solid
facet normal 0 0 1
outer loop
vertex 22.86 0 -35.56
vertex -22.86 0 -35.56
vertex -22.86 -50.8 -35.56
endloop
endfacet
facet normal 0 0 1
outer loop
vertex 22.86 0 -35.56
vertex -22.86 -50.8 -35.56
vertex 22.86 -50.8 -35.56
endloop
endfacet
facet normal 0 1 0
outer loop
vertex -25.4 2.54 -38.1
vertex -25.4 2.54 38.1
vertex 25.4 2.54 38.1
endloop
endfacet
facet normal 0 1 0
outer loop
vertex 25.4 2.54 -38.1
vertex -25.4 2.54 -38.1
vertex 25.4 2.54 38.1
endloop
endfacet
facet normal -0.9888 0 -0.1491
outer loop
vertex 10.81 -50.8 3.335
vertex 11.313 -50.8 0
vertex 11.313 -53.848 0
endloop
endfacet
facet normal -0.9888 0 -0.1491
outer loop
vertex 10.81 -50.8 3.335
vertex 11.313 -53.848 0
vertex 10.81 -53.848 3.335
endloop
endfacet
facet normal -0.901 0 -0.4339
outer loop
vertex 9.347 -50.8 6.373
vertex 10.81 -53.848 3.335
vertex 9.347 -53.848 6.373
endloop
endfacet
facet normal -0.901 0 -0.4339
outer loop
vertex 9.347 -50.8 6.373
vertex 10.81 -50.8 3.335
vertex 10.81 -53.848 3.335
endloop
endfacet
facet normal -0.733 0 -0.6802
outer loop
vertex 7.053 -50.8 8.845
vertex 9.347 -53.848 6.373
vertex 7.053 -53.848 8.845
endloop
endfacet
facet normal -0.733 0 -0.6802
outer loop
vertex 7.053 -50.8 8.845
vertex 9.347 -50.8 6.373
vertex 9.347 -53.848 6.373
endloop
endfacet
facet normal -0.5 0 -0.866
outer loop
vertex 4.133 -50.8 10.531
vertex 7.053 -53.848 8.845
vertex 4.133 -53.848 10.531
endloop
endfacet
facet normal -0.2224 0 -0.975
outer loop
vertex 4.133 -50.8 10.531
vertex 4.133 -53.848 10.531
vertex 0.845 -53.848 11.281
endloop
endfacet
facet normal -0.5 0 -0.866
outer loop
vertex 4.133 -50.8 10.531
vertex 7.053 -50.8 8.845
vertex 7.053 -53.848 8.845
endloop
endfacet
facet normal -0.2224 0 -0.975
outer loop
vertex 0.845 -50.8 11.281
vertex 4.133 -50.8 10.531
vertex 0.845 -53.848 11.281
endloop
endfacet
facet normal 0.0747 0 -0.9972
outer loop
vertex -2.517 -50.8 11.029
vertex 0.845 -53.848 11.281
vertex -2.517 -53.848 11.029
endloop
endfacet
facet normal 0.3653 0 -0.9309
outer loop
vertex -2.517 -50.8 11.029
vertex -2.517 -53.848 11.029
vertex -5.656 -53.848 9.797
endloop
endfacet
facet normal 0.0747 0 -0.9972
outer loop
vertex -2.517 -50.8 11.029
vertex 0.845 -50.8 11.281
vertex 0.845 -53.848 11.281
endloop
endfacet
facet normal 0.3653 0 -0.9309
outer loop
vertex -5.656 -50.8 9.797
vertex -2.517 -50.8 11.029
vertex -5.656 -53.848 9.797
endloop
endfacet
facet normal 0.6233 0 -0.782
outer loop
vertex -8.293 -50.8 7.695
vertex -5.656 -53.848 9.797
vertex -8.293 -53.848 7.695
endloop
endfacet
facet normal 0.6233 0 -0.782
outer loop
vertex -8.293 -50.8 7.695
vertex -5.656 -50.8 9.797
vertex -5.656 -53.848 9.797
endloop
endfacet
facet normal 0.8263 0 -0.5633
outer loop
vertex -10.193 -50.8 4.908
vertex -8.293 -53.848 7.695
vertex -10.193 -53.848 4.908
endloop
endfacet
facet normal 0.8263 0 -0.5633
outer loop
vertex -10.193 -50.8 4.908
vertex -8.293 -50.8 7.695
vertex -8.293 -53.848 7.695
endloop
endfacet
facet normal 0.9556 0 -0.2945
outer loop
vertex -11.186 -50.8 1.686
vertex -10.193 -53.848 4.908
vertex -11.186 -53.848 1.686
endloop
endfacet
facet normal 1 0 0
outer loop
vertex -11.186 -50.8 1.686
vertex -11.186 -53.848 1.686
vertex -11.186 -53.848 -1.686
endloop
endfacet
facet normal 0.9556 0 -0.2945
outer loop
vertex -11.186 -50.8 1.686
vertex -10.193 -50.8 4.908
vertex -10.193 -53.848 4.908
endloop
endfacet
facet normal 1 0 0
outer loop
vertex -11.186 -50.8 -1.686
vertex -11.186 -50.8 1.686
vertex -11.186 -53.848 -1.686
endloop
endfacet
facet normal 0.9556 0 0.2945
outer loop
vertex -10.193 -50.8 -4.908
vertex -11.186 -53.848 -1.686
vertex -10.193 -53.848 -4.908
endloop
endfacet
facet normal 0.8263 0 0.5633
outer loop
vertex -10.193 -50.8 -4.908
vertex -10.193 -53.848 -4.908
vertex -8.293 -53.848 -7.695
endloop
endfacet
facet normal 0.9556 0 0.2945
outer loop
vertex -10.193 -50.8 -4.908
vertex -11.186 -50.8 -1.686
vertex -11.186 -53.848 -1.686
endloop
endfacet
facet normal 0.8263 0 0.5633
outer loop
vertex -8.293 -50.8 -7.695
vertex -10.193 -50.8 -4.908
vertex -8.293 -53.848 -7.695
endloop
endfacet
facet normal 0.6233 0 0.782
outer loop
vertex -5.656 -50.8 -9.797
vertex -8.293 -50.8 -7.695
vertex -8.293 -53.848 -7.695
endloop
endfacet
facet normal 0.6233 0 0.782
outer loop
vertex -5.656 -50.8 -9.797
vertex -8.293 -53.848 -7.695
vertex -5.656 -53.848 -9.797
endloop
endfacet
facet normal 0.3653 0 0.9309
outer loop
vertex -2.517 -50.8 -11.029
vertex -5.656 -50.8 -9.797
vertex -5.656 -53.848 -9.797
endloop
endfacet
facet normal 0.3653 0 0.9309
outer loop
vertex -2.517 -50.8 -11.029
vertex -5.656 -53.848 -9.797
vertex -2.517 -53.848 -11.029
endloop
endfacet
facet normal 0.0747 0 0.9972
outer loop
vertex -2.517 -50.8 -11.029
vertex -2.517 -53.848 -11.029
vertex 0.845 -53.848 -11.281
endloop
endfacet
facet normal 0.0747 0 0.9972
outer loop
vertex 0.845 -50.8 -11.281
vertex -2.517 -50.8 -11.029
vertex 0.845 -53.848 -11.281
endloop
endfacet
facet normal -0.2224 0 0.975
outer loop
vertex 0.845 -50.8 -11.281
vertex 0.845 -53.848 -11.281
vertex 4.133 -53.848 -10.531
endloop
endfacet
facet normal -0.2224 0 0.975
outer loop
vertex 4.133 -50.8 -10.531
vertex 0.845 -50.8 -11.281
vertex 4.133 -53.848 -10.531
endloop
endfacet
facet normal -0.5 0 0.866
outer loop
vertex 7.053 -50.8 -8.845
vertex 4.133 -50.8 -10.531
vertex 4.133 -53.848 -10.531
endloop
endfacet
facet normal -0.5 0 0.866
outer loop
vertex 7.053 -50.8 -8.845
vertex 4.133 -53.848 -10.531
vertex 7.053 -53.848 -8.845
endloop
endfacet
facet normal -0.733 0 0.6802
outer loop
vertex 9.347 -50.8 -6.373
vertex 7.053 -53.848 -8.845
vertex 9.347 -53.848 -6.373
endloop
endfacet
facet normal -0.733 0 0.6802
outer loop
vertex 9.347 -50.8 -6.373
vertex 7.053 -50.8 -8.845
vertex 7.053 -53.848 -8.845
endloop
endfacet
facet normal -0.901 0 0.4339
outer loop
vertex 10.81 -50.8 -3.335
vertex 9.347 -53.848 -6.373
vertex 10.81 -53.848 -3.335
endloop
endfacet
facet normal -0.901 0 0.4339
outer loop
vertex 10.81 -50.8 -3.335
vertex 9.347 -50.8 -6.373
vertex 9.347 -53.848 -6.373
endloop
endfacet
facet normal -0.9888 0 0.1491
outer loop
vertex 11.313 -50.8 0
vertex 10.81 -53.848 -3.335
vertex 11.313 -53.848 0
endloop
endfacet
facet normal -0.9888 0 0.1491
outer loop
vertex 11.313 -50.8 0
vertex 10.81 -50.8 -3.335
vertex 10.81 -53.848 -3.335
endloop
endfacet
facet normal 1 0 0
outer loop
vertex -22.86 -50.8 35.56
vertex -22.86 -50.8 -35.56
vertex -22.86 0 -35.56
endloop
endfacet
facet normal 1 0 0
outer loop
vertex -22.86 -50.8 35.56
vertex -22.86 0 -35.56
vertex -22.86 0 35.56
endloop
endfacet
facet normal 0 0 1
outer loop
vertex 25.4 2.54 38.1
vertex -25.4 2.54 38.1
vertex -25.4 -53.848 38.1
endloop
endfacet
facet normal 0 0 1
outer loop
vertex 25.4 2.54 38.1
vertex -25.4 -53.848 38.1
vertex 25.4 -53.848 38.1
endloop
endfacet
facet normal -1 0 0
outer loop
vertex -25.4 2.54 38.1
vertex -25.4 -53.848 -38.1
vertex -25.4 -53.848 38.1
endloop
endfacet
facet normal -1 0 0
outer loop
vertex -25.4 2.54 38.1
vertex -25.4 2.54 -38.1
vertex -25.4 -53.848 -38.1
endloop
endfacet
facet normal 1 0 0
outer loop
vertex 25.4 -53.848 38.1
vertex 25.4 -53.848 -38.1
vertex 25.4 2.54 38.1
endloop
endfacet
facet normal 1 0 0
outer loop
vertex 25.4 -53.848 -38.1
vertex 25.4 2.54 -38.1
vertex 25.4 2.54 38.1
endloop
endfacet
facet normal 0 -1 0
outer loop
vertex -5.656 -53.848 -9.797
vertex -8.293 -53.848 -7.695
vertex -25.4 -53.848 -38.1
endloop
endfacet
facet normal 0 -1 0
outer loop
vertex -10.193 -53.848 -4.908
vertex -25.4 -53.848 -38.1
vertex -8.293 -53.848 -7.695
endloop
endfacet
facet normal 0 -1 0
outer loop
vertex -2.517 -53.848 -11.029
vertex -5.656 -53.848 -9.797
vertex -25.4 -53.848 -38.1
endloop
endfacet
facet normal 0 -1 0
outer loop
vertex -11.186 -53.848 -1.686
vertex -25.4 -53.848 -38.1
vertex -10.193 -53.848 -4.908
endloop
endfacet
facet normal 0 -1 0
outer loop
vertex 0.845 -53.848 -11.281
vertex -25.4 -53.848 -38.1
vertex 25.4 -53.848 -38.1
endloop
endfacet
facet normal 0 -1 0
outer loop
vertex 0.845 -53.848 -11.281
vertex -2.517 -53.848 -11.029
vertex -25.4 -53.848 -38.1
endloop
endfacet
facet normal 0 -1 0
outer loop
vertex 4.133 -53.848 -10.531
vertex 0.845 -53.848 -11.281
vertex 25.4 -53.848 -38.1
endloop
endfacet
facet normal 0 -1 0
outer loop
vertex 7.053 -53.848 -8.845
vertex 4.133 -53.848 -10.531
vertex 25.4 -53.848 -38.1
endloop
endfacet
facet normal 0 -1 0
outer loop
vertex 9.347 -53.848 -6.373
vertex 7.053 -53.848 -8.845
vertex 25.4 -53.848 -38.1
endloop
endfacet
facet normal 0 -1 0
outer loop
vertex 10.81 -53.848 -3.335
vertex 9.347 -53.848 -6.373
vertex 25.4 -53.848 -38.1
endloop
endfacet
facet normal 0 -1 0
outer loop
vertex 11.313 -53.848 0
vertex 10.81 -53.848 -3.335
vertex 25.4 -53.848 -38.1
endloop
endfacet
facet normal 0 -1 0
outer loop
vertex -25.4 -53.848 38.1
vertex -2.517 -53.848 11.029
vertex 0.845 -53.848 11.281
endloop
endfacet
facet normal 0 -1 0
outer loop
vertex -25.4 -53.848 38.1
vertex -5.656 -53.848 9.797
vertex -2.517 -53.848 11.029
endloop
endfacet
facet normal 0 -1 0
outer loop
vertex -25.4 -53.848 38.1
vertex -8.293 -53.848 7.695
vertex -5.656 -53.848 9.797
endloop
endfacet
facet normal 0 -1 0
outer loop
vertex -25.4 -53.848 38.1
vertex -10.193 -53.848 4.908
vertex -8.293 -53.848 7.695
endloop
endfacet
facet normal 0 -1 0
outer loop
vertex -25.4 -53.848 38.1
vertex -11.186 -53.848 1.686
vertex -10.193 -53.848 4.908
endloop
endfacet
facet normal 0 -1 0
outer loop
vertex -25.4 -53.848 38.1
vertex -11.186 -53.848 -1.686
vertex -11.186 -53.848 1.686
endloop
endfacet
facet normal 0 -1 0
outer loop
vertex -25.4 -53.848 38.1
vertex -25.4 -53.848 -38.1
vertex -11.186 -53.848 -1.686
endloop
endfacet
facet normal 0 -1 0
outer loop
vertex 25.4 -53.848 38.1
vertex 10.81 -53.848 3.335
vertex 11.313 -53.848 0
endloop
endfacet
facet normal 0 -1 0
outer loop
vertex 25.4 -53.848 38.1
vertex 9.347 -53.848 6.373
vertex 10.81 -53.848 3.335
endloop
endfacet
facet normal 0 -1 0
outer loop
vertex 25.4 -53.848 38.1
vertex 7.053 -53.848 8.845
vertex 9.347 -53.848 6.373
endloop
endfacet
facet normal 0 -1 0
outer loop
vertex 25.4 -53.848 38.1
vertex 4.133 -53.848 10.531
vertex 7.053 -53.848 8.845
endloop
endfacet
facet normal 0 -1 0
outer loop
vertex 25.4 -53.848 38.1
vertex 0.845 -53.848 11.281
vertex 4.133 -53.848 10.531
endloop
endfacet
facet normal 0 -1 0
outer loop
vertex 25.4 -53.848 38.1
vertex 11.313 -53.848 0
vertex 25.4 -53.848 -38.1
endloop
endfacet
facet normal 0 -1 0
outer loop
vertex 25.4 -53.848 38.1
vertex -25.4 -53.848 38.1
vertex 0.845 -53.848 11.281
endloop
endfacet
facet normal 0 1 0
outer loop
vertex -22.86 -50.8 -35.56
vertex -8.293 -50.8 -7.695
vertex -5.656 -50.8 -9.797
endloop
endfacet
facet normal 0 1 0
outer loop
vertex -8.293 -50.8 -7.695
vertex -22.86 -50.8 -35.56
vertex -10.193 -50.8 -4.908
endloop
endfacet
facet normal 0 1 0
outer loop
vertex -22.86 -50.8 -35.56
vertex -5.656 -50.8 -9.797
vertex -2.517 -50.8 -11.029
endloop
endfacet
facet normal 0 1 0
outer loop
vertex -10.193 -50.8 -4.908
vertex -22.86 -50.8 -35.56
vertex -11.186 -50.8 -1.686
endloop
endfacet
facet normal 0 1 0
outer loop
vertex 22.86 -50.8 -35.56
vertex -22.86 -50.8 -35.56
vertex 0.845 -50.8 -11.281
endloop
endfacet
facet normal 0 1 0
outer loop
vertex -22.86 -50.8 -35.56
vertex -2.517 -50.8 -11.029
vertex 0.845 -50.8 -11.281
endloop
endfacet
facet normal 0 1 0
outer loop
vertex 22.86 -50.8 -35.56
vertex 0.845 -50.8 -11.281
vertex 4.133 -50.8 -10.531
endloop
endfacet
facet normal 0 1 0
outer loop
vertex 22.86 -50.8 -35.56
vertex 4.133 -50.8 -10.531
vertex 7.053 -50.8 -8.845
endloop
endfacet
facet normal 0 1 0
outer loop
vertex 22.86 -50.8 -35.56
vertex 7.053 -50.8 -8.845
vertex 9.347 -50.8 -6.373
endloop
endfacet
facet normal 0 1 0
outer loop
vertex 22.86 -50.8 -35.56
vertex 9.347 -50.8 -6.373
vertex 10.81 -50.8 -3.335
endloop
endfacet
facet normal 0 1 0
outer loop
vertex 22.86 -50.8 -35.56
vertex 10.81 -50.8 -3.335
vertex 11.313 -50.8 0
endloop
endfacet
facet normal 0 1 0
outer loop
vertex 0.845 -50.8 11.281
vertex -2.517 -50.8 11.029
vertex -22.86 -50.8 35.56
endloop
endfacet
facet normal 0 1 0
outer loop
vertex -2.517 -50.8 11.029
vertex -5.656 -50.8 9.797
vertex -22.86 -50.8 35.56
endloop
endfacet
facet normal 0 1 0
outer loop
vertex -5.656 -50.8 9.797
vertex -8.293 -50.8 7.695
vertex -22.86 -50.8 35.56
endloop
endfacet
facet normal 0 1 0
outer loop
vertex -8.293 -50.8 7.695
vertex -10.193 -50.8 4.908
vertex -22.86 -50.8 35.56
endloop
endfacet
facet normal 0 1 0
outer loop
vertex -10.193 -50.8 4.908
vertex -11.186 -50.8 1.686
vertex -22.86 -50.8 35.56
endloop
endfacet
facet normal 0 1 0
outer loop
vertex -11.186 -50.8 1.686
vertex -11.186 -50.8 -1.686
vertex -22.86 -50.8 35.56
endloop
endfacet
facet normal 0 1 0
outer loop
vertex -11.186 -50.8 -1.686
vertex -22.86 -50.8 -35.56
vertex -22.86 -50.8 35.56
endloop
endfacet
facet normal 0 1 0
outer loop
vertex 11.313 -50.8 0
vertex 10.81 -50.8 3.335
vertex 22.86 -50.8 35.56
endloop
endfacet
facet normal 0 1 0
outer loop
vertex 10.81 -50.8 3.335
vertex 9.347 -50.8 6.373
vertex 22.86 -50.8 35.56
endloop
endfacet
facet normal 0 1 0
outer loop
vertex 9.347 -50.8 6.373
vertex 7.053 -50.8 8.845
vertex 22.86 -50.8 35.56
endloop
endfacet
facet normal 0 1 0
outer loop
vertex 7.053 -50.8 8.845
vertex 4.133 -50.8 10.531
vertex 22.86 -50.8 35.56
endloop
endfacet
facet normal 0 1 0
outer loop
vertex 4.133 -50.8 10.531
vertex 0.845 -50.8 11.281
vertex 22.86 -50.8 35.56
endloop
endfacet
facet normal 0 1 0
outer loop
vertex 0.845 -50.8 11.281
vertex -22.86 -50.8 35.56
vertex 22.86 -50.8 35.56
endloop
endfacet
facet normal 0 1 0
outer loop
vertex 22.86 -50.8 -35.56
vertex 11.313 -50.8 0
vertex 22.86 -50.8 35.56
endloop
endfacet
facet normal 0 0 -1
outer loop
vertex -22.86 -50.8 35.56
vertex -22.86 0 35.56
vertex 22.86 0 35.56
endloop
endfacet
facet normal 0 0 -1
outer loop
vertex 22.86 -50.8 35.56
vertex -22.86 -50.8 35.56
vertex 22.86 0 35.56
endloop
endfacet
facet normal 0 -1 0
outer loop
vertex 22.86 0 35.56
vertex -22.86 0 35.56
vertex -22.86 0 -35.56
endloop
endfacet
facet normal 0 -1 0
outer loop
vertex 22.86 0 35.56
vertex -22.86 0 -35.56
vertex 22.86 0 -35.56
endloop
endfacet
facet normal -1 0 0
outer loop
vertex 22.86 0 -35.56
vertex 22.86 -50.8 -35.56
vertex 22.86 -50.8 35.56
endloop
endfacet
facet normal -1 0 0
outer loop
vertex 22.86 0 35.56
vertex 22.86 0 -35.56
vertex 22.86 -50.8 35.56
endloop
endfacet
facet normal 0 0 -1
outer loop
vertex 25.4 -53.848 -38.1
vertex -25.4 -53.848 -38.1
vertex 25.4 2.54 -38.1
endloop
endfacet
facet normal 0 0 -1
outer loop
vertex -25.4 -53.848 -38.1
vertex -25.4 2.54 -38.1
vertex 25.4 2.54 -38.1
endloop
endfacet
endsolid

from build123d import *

# Parameters (mm, degrees)
F0_W     = 50.8
F0_H     = 76.2
F2_DEPTH = 50.8
F3_W     = 50.8
F3_H     = 76.2
F4_DEPTH = 2.54
F5_T     = -2.54
F6_W     = 50.8
F6_H     = 76.2
F6_W_2   = 45.72
F6_H_2   = 71.12
F6_R     = 11.312852
F7_DEPTH = 3.048


with BuildPart() as f2:
    # F0 (on Front) → F2 (new body)
    with BuildSketch(Plane.XZ):
        Rectangle(F0_W, F0_H)
    extrude(amount=F2_DEPTH)

    # F3 (on Front) → F4 (join)
    with BuildSketch(Plane.XZ):
        Rectangle(F3_W, F3_H)
    extrude(amount=-F4_DEPTH)

    # F5
    f5_openings = [f2.faces().sort_by_distance(p)[0] for p in [
        (0, -50.8, 0),
    ]]
    offset(amount=F5_T, openings=f5_openings)

    # F6 (on offset) → F7 (join)
    with BuildSketch(Plane.XZ.offset(50.8)):
        Rectangle(F6_W, F6_H)
        Rectangle(F6_W_2, F6_H_2, mode=Mode.SUBTRACT)
        Rectangle(F6_W_2, F6_H_2)
        Circle(F6_R, mode=Mode.SUBTRACT)
    extrude(amount=F7_DEPTH)


solid = f2.part
